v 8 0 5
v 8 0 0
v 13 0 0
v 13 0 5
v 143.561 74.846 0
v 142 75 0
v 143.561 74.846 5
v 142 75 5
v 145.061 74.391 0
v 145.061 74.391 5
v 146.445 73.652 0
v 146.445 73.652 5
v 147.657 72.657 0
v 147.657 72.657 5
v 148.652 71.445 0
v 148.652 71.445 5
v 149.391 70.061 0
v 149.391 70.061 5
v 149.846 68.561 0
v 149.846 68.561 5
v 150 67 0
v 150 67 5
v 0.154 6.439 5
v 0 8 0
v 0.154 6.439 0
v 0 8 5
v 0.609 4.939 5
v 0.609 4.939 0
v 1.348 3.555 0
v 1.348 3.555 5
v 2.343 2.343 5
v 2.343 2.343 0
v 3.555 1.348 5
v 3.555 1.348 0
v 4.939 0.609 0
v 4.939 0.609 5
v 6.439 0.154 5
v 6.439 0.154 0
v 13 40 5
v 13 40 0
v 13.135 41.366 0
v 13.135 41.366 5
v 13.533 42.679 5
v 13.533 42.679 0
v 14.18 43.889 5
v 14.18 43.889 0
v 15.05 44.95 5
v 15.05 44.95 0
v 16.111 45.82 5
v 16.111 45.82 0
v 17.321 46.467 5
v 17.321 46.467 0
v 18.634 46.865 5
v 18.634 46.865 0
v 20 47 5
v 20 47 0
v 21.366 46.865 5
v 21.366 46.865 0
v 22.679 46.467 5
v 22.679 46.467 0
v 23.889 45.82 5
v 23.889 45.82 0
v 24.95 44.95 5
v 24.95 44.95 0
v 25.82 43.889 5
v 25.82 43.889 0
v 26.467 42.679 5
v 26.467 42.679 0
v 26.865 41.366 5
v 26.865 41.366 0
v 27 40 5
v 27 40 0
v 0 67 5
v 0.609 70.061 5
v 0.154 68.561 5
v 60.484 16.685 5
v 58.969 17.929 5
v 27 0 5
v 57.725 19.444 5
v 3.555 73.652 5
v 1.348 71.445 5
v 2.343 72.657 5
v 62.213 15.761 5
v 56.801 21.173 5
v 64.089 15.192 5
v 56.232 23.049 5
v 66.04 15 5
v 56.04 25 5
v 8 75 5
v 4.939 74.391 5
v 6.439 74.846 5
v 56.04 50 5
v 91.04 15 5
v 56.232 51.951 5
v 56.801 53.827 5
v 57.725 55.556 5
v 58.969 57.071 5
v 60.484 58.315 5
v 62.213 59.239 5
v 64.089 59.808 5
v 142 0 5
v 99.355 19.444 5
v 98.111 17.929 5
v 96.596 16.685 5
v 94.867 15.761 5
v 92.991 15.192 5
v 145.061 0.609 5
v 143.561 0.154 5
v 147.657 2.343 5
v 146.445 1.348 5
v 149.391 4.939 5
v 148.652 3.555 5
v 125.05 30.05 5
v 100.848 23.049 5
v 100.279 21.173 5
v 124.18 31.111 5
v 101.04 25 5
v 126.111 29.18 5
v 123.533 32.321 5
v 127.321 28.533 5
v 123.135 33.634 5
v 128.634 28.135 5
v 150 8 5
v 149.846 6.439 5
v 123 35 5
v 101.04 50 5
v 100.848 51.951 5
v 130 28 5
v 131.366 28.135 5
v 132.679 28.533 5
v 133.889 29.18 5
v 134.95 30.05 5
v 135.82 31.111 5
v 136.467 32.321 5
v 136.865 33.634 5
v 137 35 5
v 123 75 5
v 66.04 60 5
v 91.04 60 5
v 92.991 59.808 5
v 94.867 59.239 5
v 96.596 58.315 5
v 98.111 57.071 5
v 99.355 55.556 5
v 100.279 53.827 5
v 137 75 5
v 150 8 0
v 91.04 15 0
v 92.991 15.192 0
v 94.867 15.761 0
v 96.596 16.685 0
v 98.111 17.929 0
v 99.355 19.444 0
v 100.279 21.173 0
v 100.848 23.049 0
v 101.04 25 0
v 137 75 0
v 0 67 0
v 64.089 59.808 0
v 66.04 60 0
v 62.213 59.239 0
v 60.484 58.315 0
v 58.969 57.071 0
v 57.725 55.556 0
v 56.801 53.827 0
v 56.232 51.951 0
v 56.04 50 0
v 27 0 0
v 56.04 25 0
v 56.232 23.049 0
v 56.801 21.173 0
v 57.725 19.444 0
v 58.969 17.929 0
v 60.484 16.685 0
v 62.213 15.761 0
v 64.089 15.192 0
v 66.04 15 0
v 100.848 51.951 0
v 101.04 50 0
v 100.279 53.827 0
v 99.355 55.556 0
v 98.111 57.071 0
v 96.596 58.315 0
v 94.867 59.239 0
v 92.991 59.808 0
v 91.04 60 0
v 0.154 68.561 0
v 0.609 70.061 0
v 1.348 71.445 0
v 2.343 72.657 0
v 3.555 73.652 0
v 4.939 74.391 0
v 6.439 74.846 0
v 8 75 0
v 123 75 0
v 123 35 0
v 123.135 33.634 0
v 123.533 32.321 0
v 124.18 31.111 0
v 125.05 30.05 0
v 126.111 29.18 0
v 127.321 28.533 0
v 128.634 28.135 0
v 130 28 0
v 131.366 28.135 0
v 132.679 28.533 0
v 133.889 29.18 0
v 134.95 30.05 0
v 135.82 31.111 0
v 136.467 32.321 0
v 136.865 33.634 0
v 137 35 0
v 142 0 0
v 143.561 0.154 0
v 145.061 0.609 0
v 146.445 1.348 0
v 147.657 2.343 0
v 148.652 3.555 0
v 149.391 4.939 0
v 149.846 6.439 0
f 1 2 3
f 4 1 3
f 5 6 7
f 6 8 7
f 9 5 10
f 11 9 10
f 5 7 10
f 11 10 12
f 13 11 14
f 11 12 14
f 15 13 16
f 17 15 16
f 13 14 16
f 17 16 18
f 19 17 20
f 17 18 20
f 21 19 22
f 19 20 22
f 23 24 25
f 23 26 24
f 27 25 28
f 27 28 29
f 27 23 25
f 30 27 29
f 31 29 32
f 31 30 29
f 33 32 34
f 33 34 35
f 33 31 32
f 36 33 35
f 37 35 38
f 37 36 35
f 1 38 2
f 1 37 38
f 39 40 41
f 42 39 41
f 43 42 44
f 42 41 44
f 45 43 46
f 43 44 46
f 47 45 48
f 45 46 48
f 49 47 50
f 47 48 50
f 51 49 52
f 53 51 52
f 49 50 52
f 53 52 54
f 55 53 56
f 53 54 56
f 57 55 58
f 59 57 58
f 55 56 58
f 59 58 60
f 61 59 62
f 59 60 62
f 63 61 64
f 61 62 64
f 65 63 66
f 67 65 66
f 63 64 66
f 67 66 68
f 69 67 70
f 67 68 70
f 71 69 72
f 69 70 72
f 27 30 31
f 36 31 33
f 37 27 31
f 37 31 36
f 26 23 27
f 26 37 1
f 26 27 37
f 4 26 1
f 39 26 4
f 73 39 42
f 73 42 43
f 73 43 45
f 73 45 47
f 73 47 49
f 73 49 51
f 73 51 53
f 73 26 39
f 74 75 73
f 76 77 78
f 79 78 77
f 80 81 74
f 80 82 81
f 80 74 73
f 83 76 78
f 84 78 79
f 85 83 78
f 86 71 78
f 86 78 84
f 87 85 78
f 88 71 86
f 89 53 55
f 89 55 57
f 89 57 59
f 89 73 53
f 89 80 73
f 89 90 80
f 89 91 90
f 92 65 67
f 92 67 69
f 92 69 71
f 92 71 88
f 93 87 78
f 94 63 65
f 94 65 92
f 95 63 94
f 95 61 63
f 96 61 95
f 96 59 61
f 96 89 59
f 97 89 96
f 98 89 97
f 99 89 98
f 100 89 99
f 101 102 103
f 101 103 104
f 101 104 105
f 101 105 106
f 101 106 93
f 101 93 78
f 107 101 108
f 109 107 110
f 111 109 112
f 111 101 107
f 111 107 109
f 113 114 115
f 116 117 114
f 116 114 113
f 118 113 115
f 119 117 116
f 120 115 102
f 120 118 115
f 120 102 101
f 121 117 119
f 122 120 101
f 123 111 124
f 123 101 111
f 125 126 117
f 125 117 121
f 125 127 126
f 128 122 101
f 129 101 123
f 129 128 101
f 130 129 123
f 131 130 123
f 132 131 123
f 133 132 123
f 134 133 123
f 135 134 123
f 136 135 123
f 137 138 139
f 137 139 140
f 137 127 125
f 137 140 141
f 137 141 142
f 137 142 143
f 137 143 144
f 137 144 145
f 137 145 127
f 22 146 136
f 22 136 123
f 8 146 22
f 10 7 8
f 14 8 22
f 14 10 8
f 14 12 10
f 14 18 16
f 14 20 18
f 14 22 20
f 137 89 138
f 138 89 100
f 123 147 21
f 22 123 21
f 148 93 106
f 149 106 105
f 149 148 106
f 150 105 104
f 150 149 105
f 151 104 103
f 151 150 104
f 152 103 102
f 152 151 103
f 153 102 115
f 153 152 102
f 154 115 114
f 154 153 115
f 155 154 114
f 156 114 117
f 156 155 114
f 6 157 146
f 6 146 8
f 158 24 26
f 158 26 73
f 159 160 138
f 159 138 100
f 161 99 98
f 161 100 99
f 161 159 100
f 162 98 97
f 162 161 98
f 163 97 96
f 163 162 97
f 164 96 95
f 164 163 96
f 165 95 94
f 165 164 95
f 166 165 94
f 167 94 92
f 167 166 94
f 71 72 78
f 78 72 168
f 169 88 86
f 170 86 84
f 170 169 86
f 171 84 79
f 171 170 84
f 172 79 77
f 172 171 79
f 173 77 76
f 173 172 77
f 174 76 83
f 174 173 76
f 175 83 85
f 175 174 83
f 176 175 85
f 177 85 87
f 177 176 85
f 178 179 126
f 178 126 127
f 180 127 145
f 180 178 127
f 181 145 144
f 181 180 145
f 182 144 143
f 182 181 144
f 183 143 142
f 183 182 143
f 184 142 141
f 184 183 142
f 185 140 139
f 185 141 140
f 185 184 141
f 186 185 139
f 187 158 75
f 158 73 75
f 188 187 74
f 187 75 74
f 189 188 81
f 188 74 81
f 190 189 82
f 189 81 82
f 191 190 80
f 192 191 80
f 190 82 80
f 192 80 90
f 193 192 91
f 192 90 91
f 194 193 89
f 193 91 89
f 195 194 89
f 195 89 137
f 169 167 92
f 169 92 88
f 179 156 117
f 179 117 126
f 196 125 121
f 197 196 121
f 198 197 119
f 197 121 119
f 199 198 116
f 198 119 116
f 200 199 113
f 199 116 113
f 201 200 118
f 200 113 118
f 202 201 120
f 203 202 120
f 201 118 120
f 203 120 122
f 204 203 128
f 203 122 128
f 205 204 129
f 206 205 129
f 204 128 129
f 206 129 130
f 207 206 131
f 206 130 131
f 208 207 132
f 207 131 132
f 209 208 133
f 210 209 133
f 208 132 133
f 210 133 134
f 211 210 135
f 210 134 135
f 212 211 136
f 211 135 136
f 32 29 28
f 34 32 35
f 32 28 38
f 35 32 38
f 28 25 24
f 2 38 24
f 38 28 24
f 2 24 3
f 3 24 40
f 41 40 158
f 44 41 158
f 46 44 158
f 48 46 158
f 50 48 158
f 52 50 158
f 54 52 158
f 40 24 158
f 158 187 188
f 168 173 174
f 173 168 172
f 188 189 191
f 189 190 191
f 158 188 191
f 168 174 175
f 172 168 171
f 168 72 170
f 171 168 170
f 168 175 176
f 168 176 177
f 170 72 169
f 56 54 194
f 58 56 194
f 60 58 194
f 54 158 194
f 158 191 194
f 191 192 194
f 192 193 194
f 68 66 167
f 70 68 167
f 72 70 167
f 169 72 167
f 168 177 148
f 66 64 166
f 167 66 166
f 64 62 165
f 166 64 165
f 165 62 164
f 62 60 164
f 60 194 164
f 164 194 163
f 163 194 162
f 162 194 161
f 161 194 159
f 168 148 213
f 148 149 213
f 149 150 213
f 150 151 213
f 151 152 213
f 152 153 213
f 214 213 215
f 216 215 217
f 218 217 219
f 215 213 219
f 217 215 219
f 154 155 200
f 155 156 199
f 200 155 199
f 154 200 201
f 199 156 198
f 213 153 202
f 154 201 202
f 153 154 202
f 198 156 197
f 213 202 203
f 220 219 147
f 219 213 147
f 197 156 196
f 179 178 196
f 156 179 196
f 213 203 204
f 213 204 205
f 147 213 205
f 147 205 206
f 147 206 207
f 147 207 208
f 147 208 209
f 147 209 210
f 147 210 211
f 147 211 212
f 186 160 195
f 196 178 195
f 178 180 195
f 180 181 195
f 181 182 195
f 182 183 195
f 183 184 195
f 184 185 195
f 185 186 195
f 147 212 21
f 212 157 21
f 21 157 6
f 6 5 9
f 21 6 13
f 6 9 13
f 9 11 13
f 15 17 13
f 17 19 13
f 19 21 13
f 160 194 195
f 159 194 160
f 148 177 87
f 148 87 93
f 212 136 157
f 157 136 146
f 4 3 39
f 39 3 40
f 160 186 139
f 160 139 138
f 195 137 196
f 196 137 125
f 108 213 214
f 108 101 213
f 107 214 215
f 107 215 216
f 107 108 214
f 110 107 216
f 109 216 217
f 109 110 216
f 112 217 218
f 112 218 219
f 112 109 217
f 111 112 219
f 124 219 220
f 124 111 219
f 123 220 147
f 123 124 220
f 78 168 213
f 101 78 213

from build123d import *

# Parameters (mm, degrees)
SKETCH1_W                = 150
SKETCH1_H                = 75
BOSS_EXTRUDE2_DEPTH      = 5
CUT_EXTRUDE9_DEPTH       = 6
CUT_EXTRUDE9_DEPTH_BACK  = 1
CUT_EXTRUDE10_DEPTH      = 1
CUT_EXTRUDE10_DEPTH_BACK = 6
FILLET3_R                = 8
FILLET4_R                = 8
FILLET5_R                = 8
FILLET6_R                = 8


with BuildPart() as part:
    # Sketch1 → Boss-Extrude2 (new body)
    with BuildSketch(Plane.XY):
        with Locations((75, 37.5)):
            Rectangle(SKETCH1_W, SKETCH1_H)
    extrude(amount=BOSS_EXTRUDE2_DEPTH)

    # Sketch2 → Cut-Extrude9 (cut, two sides)
    with BuildSketch(Plane.XY) as cut_extrude9_sk:
        with BuildLine():
            Line((56.039864316, 50), (56.039864316, 25))
            ThreePointArc((56.039864316, 25), (58.968796504, 17.928932188), (66.039864316, 15))
            Line((66.039864316, 15), (91.039864316, 15))
            ThreePointArc((91.039864316, 15), (98.110932128, 17.928932188), (101.039864316, 25))
            Line((101.039864316, 25), (101.039864316, 50))
            ThreePointArc((101.039864316, 50), (98.110932128, 57.071067812), (91.039864316, 60))
            Line((91.039864316, 60), (66.039864316, 60))
            ThreePointArc((66.039864316, 60), (58.968796504, 57.071067812), (56.039864316, 50))
        make_face()
        with BuildLine():
            Line((13, 0), (13, 40))
            ThreePointArc((13, 40), (20, 47), (27, 40))
            Line((27, 40), (27, 0))
            ThreePointArc((27, 0), (20, -7), (13, 0))
        make_face()
    extrude(amount=CUT_EXTRUDE9_DEPTH, mode=Mode.SUBTRACT)
    extrude(cut_extrude9_sk.sketch, amount=-CUT_EXTRUDE9_DEPTH_BACK, mode=Mode.SUBTRACT)

    # Sketch3 → Cut-Extrude10 (cut, two sides)
    with BuildSketch(Plane.XY.offset(5)) as cut_extrude10_sk:
        with BuildLine():
            Line((123, 397.371573611), (123, 75))
            Line((123, 75), (123, 35))
            ThreePointArc((123, 35), (130, 28), (137, 35))
            Line((137, 35), (137, 75))
            Line((137, 75), (137, 397.371573611))
            Line((137, 397.371573611), (137, 1042.114720832))
            Line((137, 1042.114720832), (123, 1042.114720832))
            Line((123, 1042.114720832), (123, 397.371573611))
        make_face()
    extrude(amount=CUT_EXTRUDE10_DEPTH, mode=Mode.SUBTRACT)
    extrude(cut_extrude10_sk.sketch, amount=-CUT_EXTRUDE10_DEPTH_BACK, mode=Mode.SUBTRACT)

    # Fillet3
    fillet3_edges = [part.edges().sort_by_distance(p)[0] for p in [
        (150, 75, 2.5),
    ]]
    fillet(fillet3_edges, radius=FILLET3_R)

    # Fillet4
    fillet4_edges = [part.edges().sort_by_distance(p)[0] for p in [
        (0, 0, 2.5),
    ]]
    fillet(fillet4_edges, radius=FILLET4_R)

    # Fillet5
    fillet5_edges = [part.edges().sort_by_distance(p)[0] for p in [
        (150, 0, 2.5),
    ]]
    fillet(fillet5_edges, radius=FILLET5_R)

    # Fillet6
    fillet6_edges = [part.edges().sort_by_distance(p)[0] for p in [
        (0, 75, 2.5),
    ]]
    fillet(fillet6_edges, radius=FILLET6_R)


solid = part.part
